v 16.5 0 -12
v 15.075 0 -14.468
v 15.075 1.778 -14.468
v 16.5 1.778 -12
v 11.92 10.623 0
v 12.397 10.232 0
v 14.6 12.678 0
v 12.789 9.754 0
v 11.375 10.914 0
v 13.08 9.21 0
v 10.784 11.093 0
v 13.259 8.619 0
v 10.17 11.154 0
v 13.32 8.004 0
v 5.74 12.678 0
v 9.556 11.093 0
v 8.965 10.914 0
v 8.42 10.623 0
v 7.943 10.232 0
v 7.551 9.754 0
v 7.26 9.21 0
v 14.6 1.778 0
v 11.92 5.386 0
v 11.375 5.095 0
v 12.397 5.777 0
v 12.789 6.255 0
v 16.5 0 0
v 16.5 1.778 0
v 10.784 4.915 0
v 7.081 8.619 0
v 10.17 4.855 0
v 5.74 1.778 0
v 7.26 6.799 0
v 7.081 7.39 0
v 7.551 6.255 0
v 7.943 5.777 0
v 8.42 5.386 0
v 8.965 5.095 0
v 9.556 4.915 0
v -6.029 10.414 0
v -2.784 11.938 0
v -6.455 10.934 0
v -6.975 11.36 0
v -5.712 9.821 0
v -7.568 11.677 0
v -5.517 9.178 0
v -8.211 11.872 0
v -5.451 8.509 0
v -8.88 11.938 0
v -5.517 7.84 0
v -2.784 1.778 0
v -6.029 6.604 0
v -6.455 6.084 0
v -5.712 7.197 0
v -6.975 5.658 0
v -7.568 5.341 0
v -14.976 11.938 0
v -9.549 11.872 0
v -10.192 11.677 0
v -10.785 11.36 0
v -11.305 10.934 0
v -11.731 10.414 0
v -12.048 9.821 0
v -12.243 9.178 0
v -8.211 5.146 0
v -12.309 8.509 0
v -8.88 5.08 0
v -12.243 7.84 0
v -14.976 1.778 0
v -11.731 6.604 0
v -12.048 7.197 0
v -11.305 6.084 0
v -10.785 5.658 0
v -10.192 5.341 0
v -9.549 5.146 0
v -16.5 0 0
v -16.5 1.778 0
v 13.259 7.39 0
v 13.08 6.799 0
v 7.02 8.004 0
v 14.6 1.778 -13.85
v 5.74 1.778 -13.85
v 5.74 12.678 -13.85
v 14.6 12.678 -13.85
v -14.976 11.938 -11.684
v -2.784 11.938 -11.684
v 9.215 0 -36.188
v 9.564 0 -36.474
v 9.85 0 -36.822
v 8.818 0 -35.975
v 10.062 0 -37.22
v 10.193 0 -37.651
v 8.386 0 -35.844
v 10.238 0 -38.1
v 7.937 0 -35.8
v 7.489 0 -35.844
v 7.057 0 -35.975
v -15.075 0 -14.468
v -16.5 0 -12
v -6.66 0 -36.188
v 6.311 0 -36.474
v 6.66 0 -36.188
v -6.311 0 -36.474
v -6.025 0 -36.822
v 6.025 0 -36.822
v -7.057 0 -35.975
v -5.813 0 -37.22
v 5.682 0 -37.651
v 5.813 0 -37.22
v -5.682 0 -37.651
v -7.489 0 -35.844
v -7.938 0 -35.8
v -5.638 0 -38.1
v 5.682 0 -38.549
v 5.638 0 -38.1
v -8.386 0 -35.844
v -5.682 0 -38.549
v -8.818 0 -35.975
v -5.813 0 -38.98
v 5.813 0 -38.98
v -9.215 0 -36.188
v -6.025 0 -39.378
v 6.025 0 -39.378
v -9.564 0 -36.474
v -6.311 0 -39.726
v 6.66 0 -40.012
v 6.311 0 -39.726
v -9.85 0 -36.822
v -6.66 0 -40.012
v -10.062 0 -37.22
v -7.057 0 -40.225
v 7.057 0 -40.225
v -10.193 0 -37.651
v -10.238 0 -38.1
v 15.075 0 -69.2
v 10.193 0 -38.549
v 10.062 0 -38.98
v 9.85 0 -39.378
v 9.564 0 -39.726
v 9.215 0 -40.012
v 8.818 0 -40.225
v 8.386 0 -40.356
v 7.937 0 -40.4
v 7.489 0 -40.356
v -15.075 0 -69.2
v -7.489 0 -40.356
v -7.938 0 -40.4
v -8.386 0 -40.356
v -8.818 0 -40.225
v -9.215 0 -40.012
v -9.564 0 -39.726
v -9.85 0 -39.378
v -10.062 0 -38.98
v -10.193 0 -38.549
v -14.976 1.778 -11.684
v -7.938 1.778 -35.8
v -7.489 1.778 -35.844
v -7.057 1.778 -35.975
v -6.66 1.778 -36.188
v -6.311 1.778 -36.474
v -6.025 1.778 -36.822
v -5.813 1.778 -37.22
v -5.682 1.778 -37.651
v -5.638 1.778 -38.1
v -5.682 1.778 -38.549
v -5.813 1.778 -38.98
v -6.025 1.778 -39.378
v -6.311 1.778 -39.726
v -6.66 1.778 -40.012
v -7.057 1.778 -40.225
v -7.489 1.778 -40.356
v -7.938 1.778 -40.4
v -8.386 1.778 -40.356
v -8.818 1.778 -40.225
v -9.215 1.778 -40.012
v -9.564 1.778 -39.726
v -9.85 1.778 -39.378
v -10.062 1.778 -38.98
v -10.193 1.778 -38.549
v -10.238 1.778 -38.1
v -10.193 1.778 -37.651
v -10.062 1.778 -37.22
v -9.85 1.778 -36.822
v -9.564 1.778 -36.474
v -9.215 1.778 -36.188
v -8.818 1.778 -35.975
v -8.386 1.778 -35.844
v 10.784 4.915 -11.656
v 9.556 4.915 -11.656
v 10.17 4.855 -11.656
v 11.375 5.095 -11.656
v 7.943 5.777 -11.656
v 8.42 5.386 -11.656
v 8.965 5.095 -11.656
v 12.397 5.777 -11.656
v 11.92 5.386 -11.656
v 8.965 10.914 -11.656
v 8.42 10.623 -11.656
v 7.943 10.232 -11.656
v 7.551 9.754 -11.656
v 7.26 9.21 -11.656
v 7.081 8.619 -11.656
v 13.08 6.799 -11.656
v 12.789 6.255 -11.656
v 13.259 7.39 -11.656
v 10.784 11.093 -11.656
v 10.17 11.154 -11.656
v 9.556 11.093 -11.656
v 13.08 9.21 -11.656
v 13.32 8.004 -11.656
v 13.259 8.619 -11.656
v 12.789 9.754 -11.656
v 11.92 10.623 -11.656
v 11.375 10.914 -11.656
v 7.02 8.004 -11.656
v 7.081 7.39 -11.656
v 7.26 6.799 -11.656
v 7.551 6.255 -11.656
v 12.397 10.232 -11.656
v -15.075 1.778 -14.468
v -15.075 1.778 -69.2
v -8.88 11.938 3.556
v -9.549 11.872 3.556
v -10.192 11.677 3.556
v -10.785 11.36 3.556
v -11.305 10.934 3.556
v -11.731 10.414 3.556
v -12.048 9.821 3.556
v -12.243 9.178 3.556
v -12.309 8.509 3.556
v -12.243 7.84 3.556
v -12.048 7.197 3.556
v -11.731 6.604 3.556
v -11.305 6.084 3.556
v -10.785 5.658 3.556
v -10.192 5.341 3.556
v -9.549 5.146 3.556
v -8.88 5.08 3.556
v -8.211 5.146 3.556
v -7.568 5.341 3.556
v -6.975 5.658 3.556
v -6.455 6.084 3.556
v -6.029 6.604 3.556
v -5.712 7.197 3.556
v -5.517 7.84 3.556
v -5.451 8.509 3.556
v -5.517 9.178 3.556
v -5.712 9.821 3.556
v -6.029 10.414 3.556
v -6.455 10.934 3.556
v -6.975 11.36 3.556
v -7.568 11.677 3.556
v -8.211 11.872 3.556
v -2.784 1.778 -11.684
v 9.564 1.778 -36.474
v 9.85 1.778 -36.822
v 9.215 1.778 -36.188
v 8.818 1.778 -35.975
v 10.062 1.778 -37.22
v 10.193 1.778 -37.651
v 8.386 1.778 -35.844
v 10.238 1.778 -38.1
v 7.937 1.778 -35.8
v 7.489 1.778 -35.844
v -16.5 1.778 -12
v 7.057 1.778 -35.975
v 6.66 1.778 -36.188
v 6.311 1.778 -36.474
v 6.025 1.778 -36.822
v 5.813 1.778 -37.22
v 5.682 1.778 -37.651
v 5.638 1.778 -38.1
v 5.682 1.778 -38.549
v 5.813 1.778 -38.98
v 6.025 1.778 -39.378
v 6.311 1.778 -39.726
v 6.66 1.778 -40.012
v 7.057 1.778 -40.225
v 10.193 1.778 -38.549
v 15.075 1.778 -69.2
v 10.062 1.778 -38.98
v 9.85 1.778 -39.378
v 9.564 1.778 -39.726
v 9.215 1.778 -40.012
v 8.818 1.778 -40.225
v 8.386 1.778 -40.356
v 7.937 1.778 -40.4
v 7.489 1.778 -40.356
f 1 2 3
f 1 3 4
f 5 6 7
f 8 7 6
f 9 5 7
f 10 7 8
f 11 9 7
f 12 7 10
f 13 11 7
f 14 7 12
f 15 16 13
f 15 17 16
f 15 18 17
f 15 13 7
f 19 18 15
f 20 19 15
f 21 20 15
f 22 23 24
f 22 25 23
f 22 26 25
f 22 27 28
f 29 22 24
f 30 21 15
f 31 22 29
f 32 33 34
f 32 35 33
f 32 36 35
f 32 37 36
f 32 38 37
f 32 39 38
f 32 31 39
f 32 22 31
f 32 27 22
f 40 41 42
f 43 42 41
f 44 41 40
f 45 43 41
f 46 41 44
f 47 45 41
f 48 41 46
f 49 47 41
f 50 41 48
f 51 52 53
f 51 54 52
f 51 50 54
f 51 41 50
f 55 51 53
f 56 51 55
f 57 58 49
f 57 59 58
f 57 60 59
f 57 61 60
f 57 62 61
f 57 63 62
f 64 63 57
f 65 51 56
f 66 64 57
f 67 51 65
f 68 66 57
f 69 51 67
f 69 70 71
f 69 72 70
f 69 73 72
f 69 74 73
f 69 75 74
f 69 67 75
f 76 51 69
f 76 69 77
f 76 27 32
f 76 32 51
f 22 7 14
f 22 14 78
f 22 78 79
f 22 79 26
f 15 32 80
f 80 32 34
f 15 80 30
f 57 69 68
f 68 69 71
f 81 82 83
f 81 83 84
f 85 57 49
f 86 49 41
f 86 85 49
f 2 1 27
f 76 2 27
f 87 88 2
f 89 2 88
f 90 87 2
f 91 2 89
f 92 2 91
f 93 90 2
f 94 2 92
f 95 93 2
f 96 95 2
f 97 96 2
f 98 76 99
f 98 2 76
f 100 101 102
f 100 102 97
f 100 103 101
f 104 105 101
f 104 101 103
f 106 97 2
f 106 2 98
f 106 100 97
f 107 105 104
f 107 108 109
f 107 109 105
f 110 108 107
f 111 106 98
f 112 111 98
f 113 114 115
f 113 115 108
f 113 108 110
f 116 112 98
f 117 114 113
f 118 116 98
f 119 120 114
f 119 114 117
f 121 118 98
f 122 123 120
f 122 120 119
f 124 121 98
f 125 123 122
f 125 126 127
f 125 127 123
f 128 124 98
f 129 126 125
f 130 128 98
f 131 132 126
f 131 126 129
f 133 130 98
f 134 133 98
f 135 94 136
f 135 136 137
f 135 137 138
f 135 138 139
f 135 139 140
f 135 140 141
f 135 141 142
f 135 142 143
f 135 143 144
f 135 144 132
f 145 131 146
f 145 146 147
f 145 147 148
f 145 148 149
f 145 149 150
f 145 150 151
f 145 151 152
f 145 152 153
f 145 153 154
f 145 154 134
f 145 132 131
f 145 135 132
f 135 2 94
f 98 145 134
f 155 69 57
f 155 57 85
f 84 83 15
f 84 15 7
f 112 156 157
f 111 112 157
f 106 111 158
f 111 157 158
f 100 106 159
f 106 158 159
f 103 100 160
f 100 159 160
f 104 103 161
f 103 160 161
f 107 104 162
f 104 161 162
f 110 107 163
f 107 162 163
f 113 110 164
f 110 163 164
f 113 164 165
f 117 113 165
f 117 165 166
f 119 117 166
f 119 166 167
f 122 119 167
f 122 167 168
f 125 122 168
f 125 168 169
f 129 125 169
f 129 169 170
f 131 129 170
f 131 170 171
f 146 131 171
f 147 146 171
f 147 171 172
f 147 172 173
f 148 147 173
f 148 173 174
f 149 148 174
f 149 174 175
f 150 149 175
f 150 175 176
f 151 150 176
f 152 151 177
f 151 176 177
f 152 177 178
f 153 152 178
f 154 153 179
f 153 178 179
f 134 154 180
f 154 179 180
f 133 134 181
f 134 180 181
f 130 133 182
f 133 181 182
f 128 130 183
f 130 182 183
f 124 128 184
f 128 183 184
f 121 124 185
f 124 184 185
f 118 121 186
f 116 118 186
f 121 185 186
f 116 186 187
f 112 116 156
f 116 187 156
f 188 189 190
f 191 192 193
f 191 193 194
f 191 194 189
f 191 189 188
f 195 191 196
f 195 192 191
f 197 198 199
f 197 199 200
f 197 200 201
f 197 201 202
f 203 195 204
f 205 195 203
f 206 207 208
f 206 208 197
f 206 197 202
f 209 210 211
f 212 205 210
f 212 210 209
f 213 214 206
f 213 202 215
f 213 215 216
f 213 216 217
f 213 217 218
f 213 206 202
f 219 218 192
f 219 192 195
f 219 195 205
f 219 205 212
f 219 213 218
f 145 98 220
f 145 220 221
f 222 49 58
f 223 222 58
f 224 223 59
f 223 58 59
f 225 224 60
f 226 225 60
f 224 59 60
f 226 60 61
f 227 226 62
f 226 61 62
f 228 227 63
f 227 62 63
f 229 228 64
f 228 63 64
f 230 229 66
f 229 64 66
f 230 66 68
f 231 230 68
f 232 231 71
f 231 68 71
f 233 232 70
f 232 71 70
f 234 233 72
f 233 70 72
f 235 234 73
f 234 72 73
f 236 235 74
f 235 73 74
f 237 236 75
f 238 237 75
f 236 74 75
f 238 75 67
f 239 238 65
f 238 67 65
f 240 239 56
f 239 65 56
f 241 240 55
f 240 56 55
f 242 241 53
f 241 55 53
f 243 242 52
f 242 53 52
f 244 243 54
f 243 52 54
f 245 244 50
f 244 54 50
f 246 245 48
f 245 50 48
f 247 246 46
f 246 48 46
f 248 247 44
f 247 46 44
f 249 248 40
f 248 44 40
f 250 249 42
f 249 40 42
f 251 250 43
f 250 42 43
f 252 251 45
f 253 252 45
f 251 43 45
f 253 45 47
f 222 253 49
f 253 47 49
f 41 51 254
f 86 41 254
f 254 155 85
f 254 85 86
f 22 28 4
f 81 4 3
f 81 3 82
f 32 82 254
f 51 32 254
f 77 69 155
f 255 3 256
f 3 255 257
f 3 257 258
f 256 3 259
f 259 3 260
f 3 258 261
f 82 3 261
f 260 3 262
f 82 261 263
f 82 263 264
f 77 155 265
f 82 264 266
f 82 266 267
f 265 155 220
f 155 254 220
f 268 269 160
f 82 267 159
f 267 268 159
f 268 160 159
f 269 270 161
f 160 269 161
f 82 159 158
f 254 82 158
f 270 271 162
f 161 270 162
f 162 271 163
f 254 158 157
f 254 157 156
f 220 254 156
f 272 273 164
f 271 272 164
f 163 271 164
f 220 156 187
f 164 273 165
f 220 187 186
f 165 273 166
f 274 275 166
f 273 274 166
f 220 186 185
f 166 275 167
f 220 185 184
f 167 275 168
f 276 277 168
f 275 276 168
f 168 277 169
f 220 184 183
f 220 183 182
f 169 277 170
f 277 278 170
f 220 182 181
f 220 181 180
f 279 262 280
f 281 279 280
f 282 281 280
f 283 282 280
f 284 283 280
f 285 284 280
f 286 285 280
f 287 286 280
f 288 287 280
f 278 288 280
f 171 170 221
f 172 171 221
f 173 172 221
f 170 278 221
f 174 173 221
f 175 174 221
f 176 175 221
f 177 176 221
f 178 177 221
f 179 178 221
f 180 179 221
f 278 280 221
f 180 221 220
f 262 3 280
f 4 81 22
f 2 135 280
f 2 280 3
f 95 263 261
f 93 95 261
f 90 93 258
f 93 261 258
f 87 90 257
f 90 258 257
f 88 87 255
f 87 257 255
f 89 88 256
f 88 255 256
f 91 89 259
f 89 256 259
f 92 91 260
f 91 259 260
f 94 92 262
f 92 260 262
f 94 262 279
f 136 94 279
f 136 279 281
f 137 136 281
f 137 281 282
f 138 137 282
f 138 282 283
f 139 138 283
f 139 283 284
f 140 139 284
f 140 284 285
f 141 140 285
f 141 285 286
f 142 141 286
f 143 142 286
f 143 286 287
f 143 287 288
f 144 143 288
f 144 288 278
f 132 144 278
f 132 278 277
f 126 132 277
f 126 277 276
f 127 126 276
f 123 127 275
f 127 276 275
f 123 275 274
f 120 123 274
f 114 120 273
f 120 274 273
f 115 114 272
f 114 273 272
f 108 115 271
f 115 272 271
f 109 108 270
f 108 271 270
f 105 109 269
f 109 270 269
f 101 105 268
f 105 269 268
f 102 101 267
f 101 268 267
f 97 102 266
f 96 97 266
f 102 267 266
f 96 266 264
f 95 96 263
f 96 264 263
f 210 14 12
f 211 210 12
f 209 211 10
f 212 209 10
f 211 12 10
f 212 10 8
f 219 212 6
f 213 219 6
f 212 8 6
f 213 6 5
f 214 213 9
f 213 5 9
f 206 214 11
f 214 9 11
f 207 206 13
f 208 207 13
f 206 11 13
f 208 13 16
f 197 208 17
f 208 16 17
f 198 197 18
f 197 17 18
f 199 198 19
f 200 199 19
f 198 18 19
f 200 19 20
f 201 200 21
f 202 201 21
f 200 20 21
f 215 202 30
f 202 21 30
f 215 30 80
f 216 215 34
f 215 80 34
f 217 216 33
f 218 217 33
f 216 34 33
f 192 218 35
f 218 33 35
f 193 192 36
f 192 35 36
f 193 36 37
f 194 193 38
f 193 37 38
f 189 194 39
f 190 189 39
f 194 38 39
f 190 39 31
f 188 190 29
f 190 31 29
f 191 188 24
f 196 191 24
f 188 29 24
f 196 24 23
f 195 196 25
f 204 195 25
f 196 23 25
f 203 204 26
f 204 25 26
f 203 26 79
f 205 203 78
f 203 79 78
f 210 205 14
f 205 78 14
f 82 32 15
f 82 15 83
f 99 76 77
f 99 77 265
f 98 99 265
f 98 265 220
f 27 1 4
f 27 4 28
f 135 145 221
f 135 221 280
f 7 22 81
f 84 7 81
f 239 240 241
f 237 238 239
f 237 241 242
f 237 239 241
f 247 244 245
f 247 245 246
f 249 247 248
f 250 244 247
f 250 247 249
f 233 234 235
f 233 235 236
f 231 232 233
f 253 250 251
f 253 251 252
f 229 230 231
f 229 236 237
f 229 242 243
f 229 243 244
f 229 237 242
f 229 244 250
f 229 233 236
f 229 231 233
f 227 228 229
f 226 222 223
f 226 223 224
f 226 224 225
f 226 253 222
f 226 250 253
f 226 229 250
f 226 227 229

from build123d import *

# Parameters (mm, degrees)
BOSS_EXTRUDE1_DEPTH = 1.778
SKETCH2_W           = 8.86
SKETCH2_H           = 13.85
BOSS_EXTRUDE2_DEPTH = 10.9
SKETCH3_R           = 2.3
CUT_EXTRUDE1_DEPTH  = 72.970132694
SKETCH4_W           = 12.192
SKETCH4_H           = 11.684
BOSS_EXTRUDE3_DEPTH = 10.16
SKETCH5_R           = 3.429
BOSS_EXTRUDE4_DEPTH = 3.556
SKETCH6_R           = 3.1496
CUT_EXTRUDE2_DEPTH  = 11.656


with BuildPart() as part:
    # Sketch1 → Boss-Extrude1 (new body)
    with BuildSketch(Plane(origin=(0, 0, 0), x_dir=(1, 0, 0), z_dir=(0, 1, 0))):
        Polygon((-15.075, 69.2), (15.075, 69.2), (15.075, 14.468172401), (16.5, 12), (16.5, 0), (-16.5, 0), (-16.5, 12), (-15.075, 14.468172401), align=None)
    extrude(amount=BOSS_EXTRUDE1_DEPTH)

    # Sketch2 → Boss-Extrude2 (add)
    with BuildSketch(Plane(origin=(0, 1.778, 0), x_dir=(1, 0, 0), z_dir=(0, 1, 0))):
        with Locations((10.17, 6.925)):
            Rectangle(SKETCH2_W, SKETCH2_H)
    extrude(amount=BOSS_EXTRUDE2_DEPTH)

    # Sketch3 → Cut-Extrude1 (cut, through all)
    with BuildSketch(Plane(origin=(0, 1.778, 0), x_dir=(1, 0, 0), z_dir=(0, 1, 0))):
        with Locations(Location((-7.9375, 38.1, 0), (0, 0, 270))):
            Circle(SKETCH3_R)
        with Locations(Location((7.9375, 38.1, 0), (0, 0, 270))):
            Circle(SKETCH3_R)
    extrude(amount=-CUT_EXTRUDE1_DEPTH, mode=Mode.SUBTRACT)

    # Sketch4 → Boss-Extrude3 (add)
    with BuildSketch(Plane(origin=(0, 1.778, 0), x_dir=(1, 0, 0), z_dir=(0, 1, 0))):
        with Locations((-8.88, 5.842)):
            Rectangle(SKETCH4_W, SKETCH4_H)
    extrude(amount=BOSS_EXTRUDE3_DEPTH)

    # Sketch5 → Boss-Extrude4 (add)
    with BuildSketch(Plane.XY):
        with Locations(Location((-8.88, 8.509, 0), (0, 0, 90))):
            Circle(SKETCH5_R)
    extrude(amount=BOSS_EXTRUDE4_DEPTH)

    # Sketch6 → Cut-Extrude2 (cut)
    with BuildSketch(Plane.XY):
        with Locations((10.17, 8.0044)):
            Circle(SKETCH6_R)
    extrude(amount=-CUT_EXTRUDE2_DEPTH, mode=Mode.SUBTRACT)


solid = part.part
